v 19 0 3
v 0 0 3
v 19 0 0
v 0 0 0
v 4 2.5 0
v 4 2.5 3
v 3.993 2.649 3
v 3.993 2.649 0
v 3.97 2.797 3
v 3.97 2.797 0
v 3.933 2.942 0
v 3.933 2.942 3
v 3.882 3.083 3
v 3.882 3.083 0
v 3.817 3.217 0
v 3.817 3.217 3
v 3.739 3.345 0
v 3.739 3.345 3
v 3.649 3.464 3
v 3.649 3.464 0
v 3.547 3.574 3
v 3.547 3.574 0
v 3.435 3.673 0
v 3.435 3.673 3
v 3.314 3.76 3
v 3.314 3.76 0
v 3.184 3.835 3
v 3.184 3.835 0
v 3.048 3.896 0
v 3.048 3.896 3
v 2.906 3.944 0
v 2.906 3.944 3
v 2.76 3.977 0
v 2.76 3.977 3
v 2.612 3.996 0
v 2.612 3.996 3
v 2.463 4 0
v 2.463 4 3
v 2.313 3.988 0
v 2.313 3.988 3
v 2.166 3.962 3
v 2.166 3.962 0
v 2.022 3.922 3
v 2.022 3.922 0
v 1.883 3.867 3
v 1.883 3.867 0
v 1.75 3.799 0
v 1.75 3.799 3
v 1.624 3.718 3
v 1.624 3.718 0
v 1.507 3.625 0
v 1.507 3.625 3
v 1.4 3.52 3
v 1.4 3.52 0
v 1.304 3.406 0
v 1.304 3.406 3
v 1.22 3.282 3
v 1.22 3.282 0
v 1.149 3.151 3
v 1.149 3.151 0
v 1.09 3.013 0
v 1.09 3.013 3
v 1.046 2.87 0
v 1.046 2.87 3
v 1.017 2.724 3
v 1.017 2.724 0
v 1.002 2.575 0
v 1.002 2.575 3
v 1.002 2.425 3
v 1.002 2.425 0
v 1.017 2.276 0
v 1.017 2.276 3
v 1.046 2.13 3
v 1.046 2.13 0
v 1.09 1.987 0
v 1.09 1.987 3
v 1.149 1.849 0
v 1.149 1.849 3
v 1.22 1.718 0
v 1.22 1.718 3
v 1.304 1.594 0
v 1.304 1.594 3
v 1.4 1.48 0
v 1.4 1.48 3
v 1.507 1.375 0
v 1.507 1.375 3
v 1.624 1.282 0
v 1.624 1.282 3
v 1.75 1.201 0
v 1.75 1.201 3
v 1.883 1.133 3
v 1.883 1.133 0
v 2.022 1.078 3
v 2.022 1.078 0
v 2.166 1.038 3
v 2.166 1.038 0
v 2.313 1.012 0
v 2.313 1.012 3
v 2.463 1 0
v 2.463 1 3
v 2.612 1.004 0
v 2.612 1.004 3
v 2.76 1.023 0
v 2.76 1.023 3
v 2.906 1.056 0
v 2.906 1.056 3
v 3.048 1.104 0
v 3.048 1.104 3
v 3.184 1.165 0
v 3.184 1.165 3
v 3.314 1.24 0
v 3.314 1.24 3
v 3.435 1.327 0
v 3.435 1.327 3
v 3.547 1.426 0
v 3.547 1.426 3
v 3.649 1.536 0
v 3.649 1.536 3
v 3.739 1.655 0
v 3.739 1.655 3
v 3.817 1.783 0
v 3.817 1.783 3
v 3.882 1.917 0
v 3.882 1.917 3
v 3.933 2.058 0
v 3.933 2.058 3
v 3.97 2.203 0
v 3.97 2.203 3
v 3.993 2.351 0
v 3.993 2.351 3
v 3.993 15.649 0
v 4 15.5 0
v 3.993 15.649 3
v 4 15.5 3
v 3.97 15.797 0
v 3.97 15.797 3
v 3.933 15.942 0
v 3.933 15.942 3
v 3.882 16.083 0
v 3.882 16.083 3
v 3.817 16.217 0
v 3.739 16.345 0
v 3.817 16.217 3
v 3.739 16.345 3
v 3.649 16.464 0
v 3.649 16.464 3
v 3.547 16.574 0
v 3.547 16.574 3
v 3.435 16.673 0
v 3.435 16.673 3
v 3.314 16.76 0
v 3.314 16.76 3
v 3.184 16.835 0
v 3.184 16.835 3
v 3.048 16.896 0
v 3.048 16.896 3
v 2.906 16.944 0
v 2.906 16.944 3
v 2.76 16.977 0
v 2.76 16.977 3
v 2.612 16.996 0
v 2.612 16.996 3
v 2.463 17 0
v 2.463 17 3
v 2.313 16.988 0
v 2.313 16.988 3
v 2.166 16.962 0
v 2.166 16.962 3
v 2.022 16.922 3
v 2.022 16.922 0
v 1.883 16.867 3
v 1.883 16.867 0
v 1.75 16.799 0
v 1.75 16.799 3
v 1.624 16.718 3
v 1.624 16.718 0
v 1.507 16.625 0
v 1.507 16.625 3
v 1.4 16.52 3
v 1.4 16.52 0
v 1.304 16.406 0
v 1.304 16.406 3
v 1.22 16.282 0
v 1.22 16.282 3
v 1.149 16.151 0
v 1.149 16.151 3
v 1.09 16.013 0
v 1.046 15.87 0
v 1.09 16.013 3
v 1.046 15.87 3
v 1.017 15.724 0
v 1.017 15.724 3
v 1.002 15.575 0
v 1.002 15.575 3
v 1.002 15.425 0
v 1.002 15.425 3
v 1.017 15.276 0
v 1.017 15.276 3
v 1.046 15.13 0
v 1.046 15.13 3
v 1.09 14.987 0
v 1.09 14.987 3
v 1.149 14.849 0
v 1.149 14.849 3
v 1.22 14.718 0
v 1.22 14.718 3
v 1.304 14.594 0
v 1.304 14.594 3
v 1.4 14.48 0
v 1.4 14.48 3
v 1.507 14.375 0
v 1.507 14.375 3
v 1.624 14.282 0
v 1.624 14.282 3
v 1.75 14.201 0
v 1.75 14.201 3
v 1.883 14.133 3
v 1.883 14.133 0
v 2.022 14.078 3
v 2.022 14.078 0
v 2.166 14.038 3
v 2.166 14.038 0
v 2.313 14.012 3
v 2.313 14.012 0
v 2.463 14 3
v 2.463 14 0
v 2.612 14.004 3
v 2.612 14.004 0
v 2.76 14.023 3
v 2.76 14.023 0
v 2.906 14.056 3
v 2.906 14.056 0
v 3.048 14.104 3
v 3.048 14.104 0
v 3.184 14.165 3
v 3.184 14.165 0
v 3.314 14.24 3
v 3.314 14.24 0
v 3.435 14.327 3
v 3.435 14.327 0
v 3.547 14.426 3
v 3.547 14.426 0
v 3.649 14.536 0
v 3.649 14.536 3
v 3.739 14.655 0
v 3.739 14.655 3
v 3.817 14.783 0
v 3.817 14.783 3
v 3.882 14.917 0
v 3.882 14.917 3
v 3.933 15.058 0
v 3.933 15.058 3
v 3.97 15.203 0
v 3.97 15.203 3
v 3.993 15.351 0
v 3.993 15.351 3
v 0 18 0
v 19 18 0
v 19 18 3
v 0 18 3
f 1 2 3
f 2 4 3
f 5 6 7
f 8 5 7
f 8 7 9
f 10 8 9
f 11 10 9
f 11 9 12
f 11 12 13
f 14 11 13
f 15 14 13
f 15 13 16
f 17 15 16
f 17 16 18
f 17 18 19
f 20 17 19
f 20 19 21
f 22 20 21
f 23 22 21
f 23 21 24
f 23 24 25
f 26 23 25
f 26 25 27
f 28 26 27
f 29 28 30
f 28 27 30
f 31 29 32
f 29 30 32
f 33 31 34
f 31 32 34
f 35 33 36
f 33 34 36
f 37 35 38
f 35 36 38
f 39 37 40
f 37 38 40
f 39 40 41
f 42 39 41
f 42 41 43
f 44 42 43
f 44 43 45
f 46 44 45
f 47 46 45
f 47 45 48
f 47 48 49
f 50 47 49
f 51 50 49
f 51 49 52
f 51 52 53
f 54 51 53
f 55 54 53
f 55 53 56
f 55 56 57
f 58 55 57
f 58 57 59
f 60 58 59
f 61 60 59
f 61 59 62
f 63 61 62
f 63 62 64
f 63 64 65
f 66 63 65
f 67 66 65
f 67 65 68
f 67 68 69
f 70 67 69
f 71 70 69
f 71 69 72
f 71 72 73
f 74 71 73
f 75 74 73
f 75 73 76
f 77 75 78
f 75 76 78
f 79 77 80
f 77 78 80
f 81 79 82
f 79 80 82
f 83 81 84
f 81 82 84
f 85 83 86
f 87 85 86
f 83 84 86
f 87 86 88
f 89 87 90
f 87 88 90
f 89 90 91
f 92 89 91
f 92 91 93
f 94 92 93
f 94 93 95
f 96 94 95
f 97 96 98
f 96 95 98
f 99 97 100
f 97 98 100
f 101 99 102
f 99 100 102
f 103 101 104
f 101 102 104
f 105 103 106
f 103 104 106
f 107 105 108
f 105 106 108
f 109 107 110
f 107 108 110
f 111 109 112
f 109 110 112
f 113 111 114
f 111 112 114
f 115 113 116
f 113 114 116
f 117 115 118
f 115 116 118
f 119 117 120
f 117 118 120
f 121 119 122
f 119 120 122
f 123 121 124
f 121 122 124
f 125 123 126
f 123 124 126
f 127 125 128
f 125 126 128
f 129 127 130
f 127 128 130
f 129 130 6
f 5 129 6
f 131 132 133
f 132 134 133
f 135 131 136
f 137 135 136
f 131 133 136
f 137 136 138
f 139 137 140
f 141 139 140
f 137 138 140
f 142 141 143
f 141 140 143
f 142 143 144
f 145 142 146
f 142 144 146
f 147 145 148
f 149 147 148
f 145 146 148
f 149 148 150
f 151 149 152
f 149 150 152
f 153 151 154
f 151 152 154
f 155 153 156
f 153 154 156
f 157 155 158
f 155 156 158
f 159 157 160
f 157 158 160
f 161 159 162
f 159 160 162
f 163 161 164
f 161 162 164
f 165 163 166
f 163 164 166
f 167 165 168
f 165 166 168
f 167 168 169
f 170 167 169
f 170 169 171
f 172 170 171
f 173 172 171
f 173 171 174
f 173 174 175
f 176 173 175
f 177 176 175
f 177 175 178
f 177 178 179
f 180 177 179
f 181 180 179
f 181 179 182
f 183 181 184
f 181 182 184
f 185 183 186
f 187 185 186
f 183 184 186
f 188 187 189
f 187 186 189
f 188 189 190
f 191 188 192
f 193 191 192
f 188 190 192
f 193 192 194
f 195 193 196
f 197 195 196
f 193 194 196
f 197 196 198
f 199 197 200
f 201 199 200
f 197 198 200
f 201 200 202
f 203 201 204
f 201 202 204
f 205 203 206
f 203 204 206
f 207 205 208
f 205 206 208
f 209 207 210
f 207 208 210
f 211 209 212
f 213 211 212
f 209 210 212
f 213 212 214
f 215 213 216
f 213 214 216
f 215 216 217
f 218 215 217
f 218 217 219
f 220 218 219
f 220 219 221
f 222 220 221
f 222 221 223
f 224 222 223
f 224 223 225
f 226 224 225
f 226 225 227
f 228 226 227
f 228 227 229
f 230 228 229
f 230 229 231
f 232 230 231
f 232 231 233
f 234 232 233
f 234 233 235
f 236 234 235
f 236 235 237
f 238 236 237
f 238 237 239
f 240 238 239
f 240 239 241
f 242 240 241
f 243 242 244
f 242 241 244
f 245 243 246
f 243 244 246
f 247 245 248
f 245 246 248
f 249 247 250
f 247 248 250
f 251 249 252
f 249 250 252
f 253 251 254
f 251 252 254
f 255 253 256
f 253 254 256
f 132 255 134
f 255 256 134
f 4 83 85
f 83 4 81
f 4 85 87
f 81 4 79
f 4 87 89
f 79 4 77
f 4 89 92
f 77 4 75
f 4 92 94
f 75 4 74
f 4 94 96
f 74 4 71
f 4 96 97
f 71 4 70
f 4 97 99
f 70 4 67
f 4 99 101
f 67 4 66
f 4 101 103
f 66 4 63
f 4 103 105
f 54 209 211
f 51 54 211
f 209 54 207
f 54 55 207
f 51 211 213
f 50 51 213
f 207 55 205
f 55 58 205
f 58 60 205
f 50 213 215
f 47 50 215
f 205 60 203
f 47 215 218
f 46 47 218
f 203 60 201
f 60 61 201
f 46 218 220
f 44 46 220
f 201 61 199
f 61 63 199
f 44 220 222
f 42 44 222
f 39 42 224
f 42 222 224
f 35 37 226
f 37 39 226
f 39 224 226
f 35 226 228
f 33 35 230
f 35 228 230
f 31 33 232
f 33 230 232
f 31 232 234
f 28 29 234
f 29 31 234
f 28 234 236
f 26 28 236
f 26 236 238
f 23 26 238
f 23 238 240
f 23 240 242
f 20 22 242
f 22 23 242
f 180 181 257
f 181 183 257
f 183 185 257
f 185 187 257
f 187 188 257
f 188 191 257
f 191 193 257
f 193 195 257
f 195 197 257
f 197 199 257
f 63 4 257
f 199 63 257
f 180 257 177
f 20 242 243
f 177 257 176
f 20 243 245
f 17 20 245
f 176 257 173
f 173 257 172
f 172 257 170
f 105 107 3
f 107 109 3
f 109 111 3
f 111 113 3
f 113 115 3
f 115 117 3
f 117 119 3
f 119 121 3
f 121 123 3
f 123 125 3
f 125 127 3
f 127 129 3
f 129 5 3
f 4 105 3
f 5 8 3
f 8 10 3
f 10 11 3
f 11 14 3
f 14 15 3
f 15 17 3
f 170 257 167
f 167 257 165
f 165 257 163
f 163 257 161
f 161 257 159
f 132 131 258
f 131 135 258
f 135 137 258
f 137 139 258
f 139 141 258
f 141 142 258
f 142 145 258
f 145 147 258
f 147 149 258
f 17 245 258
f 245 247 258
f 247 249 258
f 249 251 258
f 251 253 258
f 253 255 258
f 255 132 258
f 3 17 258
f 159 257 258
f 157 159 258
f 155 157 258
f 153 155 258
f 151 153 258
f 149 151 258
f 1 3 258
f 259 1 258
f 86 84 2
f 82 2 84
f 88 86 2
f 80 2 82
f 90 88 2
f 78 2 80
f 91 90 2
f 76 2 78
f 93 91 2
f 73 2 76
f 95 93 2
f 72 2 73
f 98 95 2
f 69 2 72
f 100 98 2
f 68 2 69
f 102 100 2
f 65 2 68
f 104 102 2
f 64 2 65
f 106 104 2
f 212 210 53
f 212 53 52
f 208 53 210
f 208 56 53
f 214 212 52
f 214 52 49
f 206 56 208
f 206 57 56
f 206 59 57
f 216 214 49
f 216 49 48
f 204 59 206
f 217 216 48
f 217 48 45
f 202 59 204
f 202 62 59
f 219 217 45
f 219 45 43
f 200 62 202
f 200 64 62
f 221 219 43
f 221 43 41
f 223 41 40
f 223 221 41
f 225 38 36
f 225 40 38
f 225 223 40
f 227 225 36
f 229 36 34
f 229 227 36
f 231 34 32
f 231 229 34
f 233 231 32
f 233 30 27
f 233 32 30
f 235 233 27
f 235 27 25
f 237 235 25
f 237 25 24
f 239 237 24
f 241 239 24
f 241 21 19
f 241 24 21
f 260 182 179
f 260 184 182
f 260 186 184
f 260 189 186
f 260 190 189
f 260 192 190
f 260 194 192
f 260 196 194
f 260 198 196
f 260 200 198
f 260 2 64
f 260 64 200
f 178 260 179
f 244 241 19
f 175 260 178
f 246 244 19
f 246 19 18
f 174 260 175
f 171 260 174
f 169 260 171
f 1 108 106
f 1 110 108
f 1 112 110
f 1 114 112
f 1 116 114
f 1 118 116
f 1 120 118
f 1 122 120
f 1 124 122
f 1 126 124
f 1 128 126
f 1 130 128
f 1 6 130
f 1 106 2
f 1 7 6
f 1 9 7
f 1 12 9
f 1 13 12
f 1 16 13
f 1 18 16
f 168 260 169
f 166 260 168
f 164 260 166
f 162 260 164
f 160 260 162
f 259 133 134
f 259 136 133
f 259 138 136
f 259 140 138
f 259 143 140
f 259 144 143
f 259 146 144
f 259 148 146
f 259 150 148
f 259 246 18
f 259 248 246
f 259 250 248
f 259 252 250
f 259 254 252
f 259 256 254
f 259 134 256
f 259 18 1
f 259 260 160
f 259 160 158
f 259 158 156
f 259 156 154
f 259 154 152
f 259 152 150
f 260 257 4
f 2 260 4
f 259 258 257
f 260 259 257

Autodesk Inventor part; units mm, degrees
ref_plane "YZ Plane" through (0, 0, 0) normal (1, 0, 0) x (0, 1, 0)
ref_plane "XZ Plane" through (0, 0, 0) normal (0, 1, 0) x (-1, 0, 0)
ref_plane "XY Plane" through (0, 0, 0) normal (0, 0, 1) x (1, 0, 0)
sketch "Esquisse1" plane through (0, 0, 0) normal (0, 0, 1) x (1, 0, 0)
  line L0 (0, 0) -> (19, 0)
  line L1 (19, 0) -> (19, 18)
  line L2 (19, 18) -> (0, 18)
  line L3 (0, 18) -> (0, 0)
  dimension "d0" = 19
  dimension "d1" = 18
extrude "Extrusion1" add sketch "Esquisse1" along normal blind 3
sketch "Esquisse2" plane through (0, 0, 3) normal (0, 0, 1) x (1, 0, 0)
  line L0 (19, 18) -> (0, 18) projected
  line L1 (0, 18) -> (0, 0) projected
  circle A0 centre (2.5, 2.5) radius 1.5
  circle A1 centre (2.5, 15.5) radius 1.5
  dimension "d4" = 13
  dimension "d5" = 2.5
  dimension "d6" = 2.5
  dimension "d7" = 2.5
  dimension "d8" = 3
  dimension "d9" = 3
extrude "Extrusion2" cut sketch "Esquisse2" against normal through all
equation "\"d7\" = d6"
properties part number "TOF - VL6180X Fermion SEN0427"
